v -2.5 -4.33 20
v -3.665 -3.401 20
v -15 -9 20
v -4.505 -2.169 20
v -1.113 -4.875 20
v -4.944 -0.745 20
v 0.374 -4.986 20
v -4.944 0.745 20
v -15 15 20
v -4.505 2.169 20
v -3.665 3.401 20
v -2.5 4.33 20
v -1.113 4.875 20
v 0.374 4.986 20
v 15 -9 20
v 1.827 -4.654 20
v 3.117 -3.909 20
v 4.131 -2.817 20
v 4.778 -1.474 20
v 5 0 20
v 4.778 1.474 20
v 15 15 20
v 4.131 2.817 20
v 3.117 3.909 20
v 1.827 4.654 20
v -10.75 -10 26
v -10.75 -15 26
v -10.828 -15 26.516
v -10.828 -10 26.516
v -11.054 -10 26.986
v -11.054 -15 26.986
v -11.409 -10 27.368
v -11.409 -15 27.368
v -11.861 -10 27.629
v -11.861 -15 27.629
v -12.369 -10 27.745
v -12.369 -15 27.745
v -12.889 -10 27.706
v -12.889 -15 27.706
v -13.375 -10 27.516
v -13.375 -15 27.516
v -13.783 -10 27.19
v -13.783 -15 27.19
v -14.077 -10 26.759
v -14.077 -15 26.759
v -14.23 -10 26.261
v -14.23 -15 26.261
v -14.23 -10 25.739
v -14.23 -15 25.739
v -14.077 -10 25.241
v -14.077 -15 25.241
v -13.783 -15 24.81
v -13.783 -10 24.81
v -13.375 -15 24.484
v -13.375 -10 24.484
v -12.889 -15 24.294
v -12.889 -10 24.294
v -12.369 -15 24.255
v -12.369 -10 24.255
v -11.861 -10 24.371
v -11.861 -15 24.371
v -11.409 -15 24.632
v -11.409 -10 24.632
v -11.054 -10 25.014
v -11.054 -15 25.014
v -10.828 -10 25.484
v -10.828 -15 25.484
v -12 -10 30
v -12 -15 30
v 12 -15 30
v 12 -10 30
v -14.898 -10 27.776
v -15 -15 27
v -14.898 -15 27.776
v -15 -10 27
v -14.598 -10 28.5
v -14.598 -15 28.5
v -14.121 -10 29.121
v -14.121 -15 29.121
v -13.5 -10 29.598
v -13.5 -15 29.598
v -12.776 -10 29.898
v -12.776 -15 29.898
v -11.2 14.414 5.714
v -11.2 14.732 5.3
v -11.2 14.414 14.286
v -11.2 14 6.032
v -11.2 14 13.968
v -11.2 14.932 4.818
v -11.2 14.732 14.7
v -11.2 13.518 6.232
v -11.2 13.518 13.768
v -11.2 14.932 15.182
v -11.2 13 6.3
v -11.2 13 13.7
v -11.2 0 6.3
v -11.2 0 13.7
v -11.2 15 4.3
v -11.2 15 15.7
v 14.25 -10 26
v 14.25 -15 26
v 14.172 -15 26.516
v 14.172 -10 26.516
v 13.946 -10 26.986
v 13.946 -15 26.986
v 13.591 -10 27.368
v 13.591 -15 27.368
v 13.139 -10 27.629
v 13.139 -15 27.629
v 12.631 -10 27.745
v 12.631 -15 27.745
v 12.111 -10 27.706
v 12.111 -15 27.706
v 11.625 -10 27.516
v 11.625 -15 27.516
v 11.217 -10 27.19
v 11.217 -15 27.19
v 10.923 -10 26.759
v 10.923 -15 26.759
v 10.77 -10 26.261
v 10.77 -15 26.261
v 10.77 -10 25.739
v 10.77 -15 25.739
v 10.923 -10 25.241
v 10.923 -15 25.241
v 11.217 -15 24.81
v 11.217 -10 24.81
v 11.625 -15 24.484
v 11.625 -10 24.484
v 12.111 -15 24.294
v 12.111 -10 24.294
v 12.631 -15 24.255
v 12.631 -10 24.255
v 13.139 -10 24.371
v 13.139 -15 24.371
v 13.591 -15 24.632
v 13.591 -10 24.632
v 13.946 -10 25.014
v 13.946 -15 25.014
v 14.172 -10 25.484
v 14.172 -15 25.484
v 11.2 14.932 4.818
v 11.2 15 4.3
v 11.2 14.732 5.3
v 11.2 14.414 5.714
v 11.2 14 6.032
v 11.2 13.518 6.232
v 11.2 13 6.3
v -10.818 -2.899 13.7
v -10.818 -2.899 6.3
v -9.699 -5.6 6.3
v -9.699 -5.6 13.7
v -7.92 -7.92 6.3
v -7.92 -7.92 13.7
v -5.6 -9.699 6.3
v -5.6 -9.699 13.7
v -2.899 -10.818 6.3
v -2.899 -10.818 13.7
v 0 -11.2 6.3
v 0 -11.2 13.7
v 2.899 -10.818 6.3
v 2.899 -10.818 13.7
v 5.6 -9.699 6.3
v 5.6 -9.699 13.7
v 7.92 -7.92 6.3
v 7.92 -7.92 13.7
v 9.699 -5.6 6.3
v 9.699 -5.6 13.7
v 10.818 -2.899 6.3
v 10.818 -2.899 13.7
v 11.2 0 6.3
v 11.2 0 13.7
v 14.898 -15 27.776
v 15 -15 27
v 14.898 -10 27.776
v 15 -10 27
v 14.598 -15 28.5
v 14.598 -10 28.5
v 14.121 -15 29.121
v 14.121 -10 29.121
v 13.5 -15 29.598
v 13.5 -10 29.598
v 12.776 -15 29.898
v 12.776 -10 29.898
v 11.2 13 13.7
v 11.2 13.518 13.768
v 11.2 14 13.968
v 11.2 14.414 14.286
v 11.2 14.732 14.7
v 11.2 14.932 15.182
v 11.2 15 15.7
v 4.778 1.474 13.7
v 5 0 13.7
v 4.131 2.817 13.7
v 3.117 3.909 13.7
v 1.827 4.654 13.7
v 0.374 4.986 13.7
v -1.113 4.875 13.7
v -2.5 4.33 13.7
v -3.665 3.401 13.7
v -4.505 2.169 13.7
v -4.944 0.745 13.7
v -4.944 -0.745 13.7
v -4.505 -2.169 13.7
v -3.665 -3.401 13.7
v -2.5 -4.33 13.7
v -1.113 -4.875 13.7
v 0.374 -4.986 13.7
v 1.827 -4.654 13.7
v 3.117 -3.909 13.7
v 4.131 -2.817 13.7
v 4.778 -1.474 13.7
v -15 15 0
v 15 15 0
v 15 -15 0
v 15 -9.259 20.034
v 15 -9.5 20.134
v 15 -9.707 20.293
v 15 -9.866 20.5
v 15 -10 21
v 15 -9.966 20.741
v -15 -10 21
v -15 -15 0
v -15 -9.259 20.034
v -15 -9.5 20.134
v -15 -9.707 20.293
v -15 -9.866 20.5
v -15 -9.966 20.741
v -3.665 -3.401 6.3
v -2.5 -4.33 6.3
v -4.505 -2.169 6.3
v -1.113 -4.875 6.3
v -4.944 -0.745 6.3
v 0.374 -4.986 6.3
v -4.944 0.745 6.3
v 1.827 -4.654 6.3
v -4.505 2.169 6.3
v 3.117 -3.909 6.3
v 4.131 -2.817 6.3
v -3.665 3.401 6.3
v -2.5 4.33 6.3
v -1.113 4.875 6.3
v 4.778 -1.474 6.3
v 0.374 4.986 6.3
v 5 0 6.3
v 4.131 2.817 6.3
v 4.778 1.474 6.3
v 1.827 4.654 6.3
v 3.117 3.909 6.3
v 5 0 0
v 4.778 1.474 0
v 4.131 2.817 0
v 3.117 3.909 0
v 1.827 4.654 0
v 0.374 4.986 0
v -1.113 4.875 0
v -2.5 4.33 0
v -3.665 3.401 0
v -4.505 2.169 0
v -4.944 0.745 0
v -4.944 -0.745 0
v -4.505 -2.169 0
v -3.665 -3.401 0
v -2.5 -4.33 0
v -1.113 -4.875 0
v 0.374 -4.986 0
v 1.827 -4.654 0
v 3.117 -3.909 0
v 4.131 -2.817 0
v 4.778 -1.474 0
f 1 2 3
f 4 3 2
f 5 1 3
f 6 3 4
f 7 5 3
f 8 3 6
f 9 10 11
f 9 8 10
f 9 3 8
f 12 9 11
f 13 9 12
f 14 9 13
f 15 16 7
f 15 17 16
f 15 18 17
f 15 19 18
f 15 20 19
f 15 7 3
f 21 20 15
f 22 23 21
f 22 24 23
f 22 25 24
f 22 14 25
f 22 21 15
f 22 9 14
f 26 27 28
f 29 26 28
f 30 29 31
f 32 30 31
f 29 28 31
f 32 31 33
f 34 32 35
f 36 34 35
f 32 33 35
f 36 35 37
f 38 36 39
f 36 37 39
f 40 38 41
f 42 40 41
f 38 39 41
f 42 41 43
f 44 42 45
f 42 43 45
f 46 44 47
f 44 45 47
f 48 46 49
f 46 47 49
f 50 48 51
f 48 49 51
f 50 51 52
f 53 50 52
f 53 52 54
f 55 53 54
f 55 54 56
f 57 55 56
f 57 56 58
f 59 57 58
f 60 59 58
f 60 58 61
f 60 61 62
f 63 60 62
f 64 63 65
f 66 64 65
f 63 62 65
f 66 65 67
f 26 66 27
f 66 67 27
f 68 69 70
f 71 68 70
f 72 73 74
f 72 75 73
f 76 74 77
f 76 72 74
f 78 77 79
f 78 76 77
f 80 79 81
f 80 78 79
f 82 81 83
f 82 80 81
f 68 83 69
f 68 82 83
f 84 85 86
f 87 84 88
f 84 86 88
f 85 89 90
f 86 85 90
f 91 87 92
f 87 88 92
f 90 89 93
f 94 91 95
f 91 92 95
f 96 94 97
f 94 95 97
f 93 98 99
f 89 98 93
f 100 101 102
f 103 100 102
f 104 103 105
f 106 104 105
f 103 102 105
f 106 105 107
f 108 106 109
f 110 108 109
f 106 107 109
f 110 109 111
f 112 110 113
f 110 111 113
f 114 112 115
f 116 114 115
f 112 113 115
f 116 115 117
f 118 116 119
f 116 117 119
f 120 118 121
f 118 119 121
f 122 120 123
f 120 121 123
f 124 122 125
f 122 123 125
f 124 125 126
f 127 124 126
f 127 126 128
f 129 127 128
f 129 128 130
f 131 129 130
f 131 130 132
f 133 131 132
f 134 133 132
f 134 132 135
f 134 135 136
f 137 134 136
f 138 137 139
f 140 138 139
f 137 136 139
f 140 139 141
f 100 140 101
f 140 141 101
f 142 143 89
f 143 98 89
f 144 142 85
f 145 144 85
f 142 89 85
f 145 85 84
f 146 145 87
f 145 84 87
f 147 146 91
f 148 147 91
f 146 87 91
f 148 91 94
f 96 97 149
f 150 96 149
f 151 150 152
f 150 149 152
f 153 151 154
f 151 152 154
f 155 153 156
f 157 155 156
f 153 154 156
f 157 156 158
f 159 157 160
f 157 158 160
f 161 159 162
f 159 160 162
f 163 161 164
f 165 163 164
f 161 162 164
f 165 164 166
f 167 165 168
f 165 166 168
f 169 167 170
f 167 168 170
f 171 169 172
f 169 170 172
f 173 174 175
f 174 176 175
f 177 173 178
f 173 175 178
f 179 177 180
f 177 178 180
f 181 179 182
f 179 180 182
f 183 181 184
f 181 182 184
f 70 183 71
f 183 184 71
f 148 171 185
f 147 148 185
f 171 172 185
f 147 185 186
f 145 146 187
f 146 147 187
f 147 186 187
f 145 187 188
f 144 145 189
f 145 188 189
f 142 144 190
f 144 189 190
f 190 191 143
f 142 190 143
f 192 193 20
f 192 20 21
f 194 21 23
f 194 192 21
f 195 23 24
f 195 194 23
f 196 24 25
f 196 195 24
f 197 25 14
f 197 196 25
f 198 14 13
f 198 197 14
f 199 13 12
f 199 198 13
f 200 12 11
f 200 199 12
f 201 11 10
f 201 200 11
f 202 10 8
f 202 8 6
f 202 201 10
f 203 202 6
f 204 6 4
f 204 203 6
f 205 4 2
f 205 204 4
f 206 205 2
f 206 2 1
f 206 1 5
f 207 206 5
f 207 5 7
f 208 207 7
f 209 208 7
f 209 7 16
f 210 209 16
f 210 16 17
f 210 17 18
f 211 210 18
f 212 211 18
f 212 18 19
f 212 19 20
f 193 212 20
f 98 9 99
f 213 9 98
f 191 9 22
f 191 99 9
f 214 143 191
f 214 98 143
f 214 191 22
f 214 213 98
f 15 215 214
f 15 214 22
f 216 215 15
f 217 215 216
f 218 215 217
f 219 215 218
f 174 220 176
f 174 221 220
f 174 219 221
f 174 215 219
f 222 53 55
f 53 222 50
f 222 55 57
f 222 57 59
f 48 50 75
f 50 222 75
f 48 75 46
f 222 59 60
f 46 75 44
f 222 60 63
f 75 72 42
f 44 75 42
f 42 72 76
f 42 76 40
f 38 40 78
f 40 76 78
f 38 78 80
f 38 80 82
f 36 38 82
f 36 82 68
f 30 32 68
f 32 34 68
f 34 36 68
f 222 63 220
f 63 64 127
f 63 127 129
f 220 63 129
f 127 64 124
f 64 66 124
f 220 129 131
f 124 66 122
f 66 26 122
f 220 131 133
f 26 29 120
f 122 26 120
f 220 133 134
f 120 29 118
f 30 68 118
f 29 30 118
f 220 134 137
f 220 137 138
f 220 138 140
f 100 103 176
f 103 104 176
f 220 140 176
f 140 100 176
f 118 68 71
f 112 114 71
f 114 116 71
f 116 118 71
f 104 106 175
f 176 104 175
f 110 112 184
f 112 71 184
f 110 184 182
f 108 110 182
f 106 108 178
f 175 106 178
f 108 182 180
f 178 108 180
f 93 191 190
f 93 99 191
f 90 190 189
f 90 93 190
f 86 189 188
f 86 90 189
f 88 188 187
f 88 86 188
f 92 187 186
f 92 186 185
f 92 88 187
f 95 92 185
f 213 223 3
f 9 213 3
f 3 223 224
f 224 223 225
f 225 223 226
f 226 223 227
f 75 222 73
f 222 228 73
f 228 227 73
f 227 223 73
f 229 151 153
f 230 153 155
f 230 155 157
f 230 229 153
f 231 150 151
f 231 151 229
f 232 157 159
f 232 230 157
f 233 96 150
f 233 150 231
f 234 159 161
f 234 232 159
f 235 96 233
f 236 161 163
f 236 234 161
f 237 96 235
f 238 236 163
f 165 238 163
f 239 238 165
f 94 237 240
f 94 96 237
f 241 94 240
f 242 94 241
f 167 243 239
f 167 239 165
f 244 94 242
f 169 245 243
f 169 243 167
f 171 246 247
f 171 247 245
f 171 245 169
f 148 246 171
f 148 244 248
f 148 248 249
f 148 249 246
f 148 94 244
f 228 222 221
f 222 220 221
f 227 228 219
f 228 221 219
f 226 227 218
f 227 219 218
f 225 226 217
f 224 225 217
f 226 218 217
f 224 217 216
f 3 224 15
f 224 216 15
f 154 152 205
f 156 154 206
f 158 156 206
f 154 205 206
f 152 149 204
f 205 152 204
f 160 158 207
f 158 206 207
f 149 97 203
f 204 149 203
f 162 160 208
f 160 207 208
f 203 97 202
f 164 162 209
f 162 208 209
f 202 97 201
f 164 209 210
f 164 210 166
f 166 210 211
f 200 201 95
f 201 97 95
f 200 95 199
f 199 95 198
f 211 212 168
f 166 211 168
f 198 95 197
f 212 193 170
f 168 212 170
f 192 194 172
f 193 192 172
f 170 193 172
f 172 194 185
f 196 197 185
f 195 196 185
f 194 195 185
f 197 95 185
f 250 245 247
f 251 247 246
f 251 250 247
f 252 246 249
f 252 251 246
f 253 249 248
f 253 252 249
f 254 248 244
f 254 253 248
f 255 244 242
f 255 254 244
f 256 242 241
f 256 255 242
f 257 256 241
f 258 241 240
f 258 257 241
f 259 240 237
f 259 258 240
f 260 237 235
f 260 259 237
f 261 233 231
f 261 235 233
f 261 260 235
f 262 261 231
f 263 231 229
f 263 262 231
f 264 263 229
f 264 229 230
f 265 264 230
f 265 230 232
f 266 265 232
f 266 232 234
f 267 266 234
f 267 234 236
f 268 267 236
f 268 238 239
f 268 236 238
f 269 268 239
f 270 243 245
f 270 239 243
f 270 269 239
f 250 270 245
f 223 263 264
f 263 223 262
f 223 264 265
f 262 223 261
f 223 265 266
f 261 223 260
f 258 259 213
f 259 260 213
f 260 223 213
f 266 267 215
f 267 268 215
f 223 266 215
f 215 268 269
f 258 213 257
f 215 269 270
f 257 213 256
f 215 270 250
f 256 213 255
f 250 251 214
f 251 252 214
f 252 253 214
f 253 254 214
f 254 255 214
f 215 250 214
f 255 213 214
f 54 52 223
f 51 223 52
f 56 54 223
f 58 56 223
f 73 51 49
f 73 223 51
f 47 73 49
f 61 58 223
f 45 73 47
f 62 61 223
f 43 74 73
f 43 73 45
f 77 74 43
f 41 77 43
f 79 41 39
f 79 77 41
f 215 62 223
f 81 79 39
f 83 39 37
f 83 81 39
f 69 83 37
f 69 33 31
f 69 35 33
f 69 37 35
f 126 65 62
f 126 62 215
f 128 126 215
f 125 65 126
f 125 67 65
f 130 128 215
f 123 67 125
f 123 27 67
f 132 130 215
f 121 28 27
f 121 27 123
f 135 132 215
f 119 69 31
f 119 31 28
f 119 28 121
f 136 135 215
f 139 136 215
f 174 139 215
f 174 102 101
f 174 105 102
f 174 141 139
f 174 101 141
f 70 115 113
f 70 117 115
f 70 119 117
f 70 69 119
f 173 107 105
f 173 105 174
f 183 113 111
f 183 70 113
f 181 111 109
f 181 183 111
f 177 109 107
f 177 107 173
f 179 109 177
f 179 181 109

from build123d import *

# Parameters (mm, degrees)
SKETCH2_W           = 30
SKETCH2_H           = 30
SKETCH2_R           = 5
BOSS_EXTRUDE1_DEPTH = 20
CUT_EXTRUDE2_START  = 10
CUT_EXTRUDE2_DEPTH  = 3.7
SKETCH4_W           = 30
SKETCH4_H           = 10
SKETCH4_R           = 1.75
BOSS_EXTRUDE2_DEPTH = 5
FILLET2_R           = 3
FILLET3_R           = 1
FILLET4_R           = 2


with BuildPart() as part:
    # Sketch2 → Boss-Extrude1 (new body)
    with BuildSketch(Plane.XY):
        Rectangle(SKETCH2_W, SKETCH2_H)
        Circle(SKETCH2_R, mode=Mode.SUBTRACT)
    extrude(amount=BOSS_EXTRUDE1_DEPTH)

    # Sketch3 → Cut-Extrude2 (cut, symmetric)
    with BuildSketch(Plane.XY.offset(CUT_EXTRUDE2_START)):
        with BuildLine():
            Line((-11.2, 15), (-11.2, 0))
            ThreePointArc((-11.2, 0), (0, -11.2), (11.2, 0))
            Line((11.2, 0), (11.2, 15))
            Line((11.2, 15), (-11.2, 15))
        make_face()
    extrude(amount=CUT_EXTRUDE2_DEPTH, both=True, mode=Mode.SUBTRACT)

    # Sketch4 → Boss-Extrude2 (add)
    with BuildSketch(Plane.XZ.offset(15)):
        with Locations((0, 25)):
            Rectangle(SKETCH4_W, SKETCH4_H)
        with Locations((-12.5, 26)):
            Circle(SKETCH4_R, mode=Mode.SUBTRACT)
        with Locations((12.5, 26)):
            Circle(SKETCH4_R, mode=Mode.SUBTRACT)
    extrude(amount=-BOSS_EXTRUDE2_DEPTH)

    # Fillet2
    fillet2_edges = [part.edges().sort_by_distance(p)[0] for p in [
        (-15, -12.5, 30),
        (15, -12.5, 30),
    ]]
    fillet(fillet2_edges, radius=FILLET2_R)

    # Fillet3
    fillet3_edges = [part.edges().sort_by_distance(p)[0] for p in [
        (0, -10, 20),
    ]]
    fillet(fillet3_edges, radius=FILLET3_R)

    # Fillet4
    fillet4_edges = [part.edges().sort_by_distance(p)[0] for p in [
        (0, 15, 6.3),
        (0, 15, 13.7),
    ]]
    fillet(fillet4_edges, radius=FILLET4_R)


solid = part.part
